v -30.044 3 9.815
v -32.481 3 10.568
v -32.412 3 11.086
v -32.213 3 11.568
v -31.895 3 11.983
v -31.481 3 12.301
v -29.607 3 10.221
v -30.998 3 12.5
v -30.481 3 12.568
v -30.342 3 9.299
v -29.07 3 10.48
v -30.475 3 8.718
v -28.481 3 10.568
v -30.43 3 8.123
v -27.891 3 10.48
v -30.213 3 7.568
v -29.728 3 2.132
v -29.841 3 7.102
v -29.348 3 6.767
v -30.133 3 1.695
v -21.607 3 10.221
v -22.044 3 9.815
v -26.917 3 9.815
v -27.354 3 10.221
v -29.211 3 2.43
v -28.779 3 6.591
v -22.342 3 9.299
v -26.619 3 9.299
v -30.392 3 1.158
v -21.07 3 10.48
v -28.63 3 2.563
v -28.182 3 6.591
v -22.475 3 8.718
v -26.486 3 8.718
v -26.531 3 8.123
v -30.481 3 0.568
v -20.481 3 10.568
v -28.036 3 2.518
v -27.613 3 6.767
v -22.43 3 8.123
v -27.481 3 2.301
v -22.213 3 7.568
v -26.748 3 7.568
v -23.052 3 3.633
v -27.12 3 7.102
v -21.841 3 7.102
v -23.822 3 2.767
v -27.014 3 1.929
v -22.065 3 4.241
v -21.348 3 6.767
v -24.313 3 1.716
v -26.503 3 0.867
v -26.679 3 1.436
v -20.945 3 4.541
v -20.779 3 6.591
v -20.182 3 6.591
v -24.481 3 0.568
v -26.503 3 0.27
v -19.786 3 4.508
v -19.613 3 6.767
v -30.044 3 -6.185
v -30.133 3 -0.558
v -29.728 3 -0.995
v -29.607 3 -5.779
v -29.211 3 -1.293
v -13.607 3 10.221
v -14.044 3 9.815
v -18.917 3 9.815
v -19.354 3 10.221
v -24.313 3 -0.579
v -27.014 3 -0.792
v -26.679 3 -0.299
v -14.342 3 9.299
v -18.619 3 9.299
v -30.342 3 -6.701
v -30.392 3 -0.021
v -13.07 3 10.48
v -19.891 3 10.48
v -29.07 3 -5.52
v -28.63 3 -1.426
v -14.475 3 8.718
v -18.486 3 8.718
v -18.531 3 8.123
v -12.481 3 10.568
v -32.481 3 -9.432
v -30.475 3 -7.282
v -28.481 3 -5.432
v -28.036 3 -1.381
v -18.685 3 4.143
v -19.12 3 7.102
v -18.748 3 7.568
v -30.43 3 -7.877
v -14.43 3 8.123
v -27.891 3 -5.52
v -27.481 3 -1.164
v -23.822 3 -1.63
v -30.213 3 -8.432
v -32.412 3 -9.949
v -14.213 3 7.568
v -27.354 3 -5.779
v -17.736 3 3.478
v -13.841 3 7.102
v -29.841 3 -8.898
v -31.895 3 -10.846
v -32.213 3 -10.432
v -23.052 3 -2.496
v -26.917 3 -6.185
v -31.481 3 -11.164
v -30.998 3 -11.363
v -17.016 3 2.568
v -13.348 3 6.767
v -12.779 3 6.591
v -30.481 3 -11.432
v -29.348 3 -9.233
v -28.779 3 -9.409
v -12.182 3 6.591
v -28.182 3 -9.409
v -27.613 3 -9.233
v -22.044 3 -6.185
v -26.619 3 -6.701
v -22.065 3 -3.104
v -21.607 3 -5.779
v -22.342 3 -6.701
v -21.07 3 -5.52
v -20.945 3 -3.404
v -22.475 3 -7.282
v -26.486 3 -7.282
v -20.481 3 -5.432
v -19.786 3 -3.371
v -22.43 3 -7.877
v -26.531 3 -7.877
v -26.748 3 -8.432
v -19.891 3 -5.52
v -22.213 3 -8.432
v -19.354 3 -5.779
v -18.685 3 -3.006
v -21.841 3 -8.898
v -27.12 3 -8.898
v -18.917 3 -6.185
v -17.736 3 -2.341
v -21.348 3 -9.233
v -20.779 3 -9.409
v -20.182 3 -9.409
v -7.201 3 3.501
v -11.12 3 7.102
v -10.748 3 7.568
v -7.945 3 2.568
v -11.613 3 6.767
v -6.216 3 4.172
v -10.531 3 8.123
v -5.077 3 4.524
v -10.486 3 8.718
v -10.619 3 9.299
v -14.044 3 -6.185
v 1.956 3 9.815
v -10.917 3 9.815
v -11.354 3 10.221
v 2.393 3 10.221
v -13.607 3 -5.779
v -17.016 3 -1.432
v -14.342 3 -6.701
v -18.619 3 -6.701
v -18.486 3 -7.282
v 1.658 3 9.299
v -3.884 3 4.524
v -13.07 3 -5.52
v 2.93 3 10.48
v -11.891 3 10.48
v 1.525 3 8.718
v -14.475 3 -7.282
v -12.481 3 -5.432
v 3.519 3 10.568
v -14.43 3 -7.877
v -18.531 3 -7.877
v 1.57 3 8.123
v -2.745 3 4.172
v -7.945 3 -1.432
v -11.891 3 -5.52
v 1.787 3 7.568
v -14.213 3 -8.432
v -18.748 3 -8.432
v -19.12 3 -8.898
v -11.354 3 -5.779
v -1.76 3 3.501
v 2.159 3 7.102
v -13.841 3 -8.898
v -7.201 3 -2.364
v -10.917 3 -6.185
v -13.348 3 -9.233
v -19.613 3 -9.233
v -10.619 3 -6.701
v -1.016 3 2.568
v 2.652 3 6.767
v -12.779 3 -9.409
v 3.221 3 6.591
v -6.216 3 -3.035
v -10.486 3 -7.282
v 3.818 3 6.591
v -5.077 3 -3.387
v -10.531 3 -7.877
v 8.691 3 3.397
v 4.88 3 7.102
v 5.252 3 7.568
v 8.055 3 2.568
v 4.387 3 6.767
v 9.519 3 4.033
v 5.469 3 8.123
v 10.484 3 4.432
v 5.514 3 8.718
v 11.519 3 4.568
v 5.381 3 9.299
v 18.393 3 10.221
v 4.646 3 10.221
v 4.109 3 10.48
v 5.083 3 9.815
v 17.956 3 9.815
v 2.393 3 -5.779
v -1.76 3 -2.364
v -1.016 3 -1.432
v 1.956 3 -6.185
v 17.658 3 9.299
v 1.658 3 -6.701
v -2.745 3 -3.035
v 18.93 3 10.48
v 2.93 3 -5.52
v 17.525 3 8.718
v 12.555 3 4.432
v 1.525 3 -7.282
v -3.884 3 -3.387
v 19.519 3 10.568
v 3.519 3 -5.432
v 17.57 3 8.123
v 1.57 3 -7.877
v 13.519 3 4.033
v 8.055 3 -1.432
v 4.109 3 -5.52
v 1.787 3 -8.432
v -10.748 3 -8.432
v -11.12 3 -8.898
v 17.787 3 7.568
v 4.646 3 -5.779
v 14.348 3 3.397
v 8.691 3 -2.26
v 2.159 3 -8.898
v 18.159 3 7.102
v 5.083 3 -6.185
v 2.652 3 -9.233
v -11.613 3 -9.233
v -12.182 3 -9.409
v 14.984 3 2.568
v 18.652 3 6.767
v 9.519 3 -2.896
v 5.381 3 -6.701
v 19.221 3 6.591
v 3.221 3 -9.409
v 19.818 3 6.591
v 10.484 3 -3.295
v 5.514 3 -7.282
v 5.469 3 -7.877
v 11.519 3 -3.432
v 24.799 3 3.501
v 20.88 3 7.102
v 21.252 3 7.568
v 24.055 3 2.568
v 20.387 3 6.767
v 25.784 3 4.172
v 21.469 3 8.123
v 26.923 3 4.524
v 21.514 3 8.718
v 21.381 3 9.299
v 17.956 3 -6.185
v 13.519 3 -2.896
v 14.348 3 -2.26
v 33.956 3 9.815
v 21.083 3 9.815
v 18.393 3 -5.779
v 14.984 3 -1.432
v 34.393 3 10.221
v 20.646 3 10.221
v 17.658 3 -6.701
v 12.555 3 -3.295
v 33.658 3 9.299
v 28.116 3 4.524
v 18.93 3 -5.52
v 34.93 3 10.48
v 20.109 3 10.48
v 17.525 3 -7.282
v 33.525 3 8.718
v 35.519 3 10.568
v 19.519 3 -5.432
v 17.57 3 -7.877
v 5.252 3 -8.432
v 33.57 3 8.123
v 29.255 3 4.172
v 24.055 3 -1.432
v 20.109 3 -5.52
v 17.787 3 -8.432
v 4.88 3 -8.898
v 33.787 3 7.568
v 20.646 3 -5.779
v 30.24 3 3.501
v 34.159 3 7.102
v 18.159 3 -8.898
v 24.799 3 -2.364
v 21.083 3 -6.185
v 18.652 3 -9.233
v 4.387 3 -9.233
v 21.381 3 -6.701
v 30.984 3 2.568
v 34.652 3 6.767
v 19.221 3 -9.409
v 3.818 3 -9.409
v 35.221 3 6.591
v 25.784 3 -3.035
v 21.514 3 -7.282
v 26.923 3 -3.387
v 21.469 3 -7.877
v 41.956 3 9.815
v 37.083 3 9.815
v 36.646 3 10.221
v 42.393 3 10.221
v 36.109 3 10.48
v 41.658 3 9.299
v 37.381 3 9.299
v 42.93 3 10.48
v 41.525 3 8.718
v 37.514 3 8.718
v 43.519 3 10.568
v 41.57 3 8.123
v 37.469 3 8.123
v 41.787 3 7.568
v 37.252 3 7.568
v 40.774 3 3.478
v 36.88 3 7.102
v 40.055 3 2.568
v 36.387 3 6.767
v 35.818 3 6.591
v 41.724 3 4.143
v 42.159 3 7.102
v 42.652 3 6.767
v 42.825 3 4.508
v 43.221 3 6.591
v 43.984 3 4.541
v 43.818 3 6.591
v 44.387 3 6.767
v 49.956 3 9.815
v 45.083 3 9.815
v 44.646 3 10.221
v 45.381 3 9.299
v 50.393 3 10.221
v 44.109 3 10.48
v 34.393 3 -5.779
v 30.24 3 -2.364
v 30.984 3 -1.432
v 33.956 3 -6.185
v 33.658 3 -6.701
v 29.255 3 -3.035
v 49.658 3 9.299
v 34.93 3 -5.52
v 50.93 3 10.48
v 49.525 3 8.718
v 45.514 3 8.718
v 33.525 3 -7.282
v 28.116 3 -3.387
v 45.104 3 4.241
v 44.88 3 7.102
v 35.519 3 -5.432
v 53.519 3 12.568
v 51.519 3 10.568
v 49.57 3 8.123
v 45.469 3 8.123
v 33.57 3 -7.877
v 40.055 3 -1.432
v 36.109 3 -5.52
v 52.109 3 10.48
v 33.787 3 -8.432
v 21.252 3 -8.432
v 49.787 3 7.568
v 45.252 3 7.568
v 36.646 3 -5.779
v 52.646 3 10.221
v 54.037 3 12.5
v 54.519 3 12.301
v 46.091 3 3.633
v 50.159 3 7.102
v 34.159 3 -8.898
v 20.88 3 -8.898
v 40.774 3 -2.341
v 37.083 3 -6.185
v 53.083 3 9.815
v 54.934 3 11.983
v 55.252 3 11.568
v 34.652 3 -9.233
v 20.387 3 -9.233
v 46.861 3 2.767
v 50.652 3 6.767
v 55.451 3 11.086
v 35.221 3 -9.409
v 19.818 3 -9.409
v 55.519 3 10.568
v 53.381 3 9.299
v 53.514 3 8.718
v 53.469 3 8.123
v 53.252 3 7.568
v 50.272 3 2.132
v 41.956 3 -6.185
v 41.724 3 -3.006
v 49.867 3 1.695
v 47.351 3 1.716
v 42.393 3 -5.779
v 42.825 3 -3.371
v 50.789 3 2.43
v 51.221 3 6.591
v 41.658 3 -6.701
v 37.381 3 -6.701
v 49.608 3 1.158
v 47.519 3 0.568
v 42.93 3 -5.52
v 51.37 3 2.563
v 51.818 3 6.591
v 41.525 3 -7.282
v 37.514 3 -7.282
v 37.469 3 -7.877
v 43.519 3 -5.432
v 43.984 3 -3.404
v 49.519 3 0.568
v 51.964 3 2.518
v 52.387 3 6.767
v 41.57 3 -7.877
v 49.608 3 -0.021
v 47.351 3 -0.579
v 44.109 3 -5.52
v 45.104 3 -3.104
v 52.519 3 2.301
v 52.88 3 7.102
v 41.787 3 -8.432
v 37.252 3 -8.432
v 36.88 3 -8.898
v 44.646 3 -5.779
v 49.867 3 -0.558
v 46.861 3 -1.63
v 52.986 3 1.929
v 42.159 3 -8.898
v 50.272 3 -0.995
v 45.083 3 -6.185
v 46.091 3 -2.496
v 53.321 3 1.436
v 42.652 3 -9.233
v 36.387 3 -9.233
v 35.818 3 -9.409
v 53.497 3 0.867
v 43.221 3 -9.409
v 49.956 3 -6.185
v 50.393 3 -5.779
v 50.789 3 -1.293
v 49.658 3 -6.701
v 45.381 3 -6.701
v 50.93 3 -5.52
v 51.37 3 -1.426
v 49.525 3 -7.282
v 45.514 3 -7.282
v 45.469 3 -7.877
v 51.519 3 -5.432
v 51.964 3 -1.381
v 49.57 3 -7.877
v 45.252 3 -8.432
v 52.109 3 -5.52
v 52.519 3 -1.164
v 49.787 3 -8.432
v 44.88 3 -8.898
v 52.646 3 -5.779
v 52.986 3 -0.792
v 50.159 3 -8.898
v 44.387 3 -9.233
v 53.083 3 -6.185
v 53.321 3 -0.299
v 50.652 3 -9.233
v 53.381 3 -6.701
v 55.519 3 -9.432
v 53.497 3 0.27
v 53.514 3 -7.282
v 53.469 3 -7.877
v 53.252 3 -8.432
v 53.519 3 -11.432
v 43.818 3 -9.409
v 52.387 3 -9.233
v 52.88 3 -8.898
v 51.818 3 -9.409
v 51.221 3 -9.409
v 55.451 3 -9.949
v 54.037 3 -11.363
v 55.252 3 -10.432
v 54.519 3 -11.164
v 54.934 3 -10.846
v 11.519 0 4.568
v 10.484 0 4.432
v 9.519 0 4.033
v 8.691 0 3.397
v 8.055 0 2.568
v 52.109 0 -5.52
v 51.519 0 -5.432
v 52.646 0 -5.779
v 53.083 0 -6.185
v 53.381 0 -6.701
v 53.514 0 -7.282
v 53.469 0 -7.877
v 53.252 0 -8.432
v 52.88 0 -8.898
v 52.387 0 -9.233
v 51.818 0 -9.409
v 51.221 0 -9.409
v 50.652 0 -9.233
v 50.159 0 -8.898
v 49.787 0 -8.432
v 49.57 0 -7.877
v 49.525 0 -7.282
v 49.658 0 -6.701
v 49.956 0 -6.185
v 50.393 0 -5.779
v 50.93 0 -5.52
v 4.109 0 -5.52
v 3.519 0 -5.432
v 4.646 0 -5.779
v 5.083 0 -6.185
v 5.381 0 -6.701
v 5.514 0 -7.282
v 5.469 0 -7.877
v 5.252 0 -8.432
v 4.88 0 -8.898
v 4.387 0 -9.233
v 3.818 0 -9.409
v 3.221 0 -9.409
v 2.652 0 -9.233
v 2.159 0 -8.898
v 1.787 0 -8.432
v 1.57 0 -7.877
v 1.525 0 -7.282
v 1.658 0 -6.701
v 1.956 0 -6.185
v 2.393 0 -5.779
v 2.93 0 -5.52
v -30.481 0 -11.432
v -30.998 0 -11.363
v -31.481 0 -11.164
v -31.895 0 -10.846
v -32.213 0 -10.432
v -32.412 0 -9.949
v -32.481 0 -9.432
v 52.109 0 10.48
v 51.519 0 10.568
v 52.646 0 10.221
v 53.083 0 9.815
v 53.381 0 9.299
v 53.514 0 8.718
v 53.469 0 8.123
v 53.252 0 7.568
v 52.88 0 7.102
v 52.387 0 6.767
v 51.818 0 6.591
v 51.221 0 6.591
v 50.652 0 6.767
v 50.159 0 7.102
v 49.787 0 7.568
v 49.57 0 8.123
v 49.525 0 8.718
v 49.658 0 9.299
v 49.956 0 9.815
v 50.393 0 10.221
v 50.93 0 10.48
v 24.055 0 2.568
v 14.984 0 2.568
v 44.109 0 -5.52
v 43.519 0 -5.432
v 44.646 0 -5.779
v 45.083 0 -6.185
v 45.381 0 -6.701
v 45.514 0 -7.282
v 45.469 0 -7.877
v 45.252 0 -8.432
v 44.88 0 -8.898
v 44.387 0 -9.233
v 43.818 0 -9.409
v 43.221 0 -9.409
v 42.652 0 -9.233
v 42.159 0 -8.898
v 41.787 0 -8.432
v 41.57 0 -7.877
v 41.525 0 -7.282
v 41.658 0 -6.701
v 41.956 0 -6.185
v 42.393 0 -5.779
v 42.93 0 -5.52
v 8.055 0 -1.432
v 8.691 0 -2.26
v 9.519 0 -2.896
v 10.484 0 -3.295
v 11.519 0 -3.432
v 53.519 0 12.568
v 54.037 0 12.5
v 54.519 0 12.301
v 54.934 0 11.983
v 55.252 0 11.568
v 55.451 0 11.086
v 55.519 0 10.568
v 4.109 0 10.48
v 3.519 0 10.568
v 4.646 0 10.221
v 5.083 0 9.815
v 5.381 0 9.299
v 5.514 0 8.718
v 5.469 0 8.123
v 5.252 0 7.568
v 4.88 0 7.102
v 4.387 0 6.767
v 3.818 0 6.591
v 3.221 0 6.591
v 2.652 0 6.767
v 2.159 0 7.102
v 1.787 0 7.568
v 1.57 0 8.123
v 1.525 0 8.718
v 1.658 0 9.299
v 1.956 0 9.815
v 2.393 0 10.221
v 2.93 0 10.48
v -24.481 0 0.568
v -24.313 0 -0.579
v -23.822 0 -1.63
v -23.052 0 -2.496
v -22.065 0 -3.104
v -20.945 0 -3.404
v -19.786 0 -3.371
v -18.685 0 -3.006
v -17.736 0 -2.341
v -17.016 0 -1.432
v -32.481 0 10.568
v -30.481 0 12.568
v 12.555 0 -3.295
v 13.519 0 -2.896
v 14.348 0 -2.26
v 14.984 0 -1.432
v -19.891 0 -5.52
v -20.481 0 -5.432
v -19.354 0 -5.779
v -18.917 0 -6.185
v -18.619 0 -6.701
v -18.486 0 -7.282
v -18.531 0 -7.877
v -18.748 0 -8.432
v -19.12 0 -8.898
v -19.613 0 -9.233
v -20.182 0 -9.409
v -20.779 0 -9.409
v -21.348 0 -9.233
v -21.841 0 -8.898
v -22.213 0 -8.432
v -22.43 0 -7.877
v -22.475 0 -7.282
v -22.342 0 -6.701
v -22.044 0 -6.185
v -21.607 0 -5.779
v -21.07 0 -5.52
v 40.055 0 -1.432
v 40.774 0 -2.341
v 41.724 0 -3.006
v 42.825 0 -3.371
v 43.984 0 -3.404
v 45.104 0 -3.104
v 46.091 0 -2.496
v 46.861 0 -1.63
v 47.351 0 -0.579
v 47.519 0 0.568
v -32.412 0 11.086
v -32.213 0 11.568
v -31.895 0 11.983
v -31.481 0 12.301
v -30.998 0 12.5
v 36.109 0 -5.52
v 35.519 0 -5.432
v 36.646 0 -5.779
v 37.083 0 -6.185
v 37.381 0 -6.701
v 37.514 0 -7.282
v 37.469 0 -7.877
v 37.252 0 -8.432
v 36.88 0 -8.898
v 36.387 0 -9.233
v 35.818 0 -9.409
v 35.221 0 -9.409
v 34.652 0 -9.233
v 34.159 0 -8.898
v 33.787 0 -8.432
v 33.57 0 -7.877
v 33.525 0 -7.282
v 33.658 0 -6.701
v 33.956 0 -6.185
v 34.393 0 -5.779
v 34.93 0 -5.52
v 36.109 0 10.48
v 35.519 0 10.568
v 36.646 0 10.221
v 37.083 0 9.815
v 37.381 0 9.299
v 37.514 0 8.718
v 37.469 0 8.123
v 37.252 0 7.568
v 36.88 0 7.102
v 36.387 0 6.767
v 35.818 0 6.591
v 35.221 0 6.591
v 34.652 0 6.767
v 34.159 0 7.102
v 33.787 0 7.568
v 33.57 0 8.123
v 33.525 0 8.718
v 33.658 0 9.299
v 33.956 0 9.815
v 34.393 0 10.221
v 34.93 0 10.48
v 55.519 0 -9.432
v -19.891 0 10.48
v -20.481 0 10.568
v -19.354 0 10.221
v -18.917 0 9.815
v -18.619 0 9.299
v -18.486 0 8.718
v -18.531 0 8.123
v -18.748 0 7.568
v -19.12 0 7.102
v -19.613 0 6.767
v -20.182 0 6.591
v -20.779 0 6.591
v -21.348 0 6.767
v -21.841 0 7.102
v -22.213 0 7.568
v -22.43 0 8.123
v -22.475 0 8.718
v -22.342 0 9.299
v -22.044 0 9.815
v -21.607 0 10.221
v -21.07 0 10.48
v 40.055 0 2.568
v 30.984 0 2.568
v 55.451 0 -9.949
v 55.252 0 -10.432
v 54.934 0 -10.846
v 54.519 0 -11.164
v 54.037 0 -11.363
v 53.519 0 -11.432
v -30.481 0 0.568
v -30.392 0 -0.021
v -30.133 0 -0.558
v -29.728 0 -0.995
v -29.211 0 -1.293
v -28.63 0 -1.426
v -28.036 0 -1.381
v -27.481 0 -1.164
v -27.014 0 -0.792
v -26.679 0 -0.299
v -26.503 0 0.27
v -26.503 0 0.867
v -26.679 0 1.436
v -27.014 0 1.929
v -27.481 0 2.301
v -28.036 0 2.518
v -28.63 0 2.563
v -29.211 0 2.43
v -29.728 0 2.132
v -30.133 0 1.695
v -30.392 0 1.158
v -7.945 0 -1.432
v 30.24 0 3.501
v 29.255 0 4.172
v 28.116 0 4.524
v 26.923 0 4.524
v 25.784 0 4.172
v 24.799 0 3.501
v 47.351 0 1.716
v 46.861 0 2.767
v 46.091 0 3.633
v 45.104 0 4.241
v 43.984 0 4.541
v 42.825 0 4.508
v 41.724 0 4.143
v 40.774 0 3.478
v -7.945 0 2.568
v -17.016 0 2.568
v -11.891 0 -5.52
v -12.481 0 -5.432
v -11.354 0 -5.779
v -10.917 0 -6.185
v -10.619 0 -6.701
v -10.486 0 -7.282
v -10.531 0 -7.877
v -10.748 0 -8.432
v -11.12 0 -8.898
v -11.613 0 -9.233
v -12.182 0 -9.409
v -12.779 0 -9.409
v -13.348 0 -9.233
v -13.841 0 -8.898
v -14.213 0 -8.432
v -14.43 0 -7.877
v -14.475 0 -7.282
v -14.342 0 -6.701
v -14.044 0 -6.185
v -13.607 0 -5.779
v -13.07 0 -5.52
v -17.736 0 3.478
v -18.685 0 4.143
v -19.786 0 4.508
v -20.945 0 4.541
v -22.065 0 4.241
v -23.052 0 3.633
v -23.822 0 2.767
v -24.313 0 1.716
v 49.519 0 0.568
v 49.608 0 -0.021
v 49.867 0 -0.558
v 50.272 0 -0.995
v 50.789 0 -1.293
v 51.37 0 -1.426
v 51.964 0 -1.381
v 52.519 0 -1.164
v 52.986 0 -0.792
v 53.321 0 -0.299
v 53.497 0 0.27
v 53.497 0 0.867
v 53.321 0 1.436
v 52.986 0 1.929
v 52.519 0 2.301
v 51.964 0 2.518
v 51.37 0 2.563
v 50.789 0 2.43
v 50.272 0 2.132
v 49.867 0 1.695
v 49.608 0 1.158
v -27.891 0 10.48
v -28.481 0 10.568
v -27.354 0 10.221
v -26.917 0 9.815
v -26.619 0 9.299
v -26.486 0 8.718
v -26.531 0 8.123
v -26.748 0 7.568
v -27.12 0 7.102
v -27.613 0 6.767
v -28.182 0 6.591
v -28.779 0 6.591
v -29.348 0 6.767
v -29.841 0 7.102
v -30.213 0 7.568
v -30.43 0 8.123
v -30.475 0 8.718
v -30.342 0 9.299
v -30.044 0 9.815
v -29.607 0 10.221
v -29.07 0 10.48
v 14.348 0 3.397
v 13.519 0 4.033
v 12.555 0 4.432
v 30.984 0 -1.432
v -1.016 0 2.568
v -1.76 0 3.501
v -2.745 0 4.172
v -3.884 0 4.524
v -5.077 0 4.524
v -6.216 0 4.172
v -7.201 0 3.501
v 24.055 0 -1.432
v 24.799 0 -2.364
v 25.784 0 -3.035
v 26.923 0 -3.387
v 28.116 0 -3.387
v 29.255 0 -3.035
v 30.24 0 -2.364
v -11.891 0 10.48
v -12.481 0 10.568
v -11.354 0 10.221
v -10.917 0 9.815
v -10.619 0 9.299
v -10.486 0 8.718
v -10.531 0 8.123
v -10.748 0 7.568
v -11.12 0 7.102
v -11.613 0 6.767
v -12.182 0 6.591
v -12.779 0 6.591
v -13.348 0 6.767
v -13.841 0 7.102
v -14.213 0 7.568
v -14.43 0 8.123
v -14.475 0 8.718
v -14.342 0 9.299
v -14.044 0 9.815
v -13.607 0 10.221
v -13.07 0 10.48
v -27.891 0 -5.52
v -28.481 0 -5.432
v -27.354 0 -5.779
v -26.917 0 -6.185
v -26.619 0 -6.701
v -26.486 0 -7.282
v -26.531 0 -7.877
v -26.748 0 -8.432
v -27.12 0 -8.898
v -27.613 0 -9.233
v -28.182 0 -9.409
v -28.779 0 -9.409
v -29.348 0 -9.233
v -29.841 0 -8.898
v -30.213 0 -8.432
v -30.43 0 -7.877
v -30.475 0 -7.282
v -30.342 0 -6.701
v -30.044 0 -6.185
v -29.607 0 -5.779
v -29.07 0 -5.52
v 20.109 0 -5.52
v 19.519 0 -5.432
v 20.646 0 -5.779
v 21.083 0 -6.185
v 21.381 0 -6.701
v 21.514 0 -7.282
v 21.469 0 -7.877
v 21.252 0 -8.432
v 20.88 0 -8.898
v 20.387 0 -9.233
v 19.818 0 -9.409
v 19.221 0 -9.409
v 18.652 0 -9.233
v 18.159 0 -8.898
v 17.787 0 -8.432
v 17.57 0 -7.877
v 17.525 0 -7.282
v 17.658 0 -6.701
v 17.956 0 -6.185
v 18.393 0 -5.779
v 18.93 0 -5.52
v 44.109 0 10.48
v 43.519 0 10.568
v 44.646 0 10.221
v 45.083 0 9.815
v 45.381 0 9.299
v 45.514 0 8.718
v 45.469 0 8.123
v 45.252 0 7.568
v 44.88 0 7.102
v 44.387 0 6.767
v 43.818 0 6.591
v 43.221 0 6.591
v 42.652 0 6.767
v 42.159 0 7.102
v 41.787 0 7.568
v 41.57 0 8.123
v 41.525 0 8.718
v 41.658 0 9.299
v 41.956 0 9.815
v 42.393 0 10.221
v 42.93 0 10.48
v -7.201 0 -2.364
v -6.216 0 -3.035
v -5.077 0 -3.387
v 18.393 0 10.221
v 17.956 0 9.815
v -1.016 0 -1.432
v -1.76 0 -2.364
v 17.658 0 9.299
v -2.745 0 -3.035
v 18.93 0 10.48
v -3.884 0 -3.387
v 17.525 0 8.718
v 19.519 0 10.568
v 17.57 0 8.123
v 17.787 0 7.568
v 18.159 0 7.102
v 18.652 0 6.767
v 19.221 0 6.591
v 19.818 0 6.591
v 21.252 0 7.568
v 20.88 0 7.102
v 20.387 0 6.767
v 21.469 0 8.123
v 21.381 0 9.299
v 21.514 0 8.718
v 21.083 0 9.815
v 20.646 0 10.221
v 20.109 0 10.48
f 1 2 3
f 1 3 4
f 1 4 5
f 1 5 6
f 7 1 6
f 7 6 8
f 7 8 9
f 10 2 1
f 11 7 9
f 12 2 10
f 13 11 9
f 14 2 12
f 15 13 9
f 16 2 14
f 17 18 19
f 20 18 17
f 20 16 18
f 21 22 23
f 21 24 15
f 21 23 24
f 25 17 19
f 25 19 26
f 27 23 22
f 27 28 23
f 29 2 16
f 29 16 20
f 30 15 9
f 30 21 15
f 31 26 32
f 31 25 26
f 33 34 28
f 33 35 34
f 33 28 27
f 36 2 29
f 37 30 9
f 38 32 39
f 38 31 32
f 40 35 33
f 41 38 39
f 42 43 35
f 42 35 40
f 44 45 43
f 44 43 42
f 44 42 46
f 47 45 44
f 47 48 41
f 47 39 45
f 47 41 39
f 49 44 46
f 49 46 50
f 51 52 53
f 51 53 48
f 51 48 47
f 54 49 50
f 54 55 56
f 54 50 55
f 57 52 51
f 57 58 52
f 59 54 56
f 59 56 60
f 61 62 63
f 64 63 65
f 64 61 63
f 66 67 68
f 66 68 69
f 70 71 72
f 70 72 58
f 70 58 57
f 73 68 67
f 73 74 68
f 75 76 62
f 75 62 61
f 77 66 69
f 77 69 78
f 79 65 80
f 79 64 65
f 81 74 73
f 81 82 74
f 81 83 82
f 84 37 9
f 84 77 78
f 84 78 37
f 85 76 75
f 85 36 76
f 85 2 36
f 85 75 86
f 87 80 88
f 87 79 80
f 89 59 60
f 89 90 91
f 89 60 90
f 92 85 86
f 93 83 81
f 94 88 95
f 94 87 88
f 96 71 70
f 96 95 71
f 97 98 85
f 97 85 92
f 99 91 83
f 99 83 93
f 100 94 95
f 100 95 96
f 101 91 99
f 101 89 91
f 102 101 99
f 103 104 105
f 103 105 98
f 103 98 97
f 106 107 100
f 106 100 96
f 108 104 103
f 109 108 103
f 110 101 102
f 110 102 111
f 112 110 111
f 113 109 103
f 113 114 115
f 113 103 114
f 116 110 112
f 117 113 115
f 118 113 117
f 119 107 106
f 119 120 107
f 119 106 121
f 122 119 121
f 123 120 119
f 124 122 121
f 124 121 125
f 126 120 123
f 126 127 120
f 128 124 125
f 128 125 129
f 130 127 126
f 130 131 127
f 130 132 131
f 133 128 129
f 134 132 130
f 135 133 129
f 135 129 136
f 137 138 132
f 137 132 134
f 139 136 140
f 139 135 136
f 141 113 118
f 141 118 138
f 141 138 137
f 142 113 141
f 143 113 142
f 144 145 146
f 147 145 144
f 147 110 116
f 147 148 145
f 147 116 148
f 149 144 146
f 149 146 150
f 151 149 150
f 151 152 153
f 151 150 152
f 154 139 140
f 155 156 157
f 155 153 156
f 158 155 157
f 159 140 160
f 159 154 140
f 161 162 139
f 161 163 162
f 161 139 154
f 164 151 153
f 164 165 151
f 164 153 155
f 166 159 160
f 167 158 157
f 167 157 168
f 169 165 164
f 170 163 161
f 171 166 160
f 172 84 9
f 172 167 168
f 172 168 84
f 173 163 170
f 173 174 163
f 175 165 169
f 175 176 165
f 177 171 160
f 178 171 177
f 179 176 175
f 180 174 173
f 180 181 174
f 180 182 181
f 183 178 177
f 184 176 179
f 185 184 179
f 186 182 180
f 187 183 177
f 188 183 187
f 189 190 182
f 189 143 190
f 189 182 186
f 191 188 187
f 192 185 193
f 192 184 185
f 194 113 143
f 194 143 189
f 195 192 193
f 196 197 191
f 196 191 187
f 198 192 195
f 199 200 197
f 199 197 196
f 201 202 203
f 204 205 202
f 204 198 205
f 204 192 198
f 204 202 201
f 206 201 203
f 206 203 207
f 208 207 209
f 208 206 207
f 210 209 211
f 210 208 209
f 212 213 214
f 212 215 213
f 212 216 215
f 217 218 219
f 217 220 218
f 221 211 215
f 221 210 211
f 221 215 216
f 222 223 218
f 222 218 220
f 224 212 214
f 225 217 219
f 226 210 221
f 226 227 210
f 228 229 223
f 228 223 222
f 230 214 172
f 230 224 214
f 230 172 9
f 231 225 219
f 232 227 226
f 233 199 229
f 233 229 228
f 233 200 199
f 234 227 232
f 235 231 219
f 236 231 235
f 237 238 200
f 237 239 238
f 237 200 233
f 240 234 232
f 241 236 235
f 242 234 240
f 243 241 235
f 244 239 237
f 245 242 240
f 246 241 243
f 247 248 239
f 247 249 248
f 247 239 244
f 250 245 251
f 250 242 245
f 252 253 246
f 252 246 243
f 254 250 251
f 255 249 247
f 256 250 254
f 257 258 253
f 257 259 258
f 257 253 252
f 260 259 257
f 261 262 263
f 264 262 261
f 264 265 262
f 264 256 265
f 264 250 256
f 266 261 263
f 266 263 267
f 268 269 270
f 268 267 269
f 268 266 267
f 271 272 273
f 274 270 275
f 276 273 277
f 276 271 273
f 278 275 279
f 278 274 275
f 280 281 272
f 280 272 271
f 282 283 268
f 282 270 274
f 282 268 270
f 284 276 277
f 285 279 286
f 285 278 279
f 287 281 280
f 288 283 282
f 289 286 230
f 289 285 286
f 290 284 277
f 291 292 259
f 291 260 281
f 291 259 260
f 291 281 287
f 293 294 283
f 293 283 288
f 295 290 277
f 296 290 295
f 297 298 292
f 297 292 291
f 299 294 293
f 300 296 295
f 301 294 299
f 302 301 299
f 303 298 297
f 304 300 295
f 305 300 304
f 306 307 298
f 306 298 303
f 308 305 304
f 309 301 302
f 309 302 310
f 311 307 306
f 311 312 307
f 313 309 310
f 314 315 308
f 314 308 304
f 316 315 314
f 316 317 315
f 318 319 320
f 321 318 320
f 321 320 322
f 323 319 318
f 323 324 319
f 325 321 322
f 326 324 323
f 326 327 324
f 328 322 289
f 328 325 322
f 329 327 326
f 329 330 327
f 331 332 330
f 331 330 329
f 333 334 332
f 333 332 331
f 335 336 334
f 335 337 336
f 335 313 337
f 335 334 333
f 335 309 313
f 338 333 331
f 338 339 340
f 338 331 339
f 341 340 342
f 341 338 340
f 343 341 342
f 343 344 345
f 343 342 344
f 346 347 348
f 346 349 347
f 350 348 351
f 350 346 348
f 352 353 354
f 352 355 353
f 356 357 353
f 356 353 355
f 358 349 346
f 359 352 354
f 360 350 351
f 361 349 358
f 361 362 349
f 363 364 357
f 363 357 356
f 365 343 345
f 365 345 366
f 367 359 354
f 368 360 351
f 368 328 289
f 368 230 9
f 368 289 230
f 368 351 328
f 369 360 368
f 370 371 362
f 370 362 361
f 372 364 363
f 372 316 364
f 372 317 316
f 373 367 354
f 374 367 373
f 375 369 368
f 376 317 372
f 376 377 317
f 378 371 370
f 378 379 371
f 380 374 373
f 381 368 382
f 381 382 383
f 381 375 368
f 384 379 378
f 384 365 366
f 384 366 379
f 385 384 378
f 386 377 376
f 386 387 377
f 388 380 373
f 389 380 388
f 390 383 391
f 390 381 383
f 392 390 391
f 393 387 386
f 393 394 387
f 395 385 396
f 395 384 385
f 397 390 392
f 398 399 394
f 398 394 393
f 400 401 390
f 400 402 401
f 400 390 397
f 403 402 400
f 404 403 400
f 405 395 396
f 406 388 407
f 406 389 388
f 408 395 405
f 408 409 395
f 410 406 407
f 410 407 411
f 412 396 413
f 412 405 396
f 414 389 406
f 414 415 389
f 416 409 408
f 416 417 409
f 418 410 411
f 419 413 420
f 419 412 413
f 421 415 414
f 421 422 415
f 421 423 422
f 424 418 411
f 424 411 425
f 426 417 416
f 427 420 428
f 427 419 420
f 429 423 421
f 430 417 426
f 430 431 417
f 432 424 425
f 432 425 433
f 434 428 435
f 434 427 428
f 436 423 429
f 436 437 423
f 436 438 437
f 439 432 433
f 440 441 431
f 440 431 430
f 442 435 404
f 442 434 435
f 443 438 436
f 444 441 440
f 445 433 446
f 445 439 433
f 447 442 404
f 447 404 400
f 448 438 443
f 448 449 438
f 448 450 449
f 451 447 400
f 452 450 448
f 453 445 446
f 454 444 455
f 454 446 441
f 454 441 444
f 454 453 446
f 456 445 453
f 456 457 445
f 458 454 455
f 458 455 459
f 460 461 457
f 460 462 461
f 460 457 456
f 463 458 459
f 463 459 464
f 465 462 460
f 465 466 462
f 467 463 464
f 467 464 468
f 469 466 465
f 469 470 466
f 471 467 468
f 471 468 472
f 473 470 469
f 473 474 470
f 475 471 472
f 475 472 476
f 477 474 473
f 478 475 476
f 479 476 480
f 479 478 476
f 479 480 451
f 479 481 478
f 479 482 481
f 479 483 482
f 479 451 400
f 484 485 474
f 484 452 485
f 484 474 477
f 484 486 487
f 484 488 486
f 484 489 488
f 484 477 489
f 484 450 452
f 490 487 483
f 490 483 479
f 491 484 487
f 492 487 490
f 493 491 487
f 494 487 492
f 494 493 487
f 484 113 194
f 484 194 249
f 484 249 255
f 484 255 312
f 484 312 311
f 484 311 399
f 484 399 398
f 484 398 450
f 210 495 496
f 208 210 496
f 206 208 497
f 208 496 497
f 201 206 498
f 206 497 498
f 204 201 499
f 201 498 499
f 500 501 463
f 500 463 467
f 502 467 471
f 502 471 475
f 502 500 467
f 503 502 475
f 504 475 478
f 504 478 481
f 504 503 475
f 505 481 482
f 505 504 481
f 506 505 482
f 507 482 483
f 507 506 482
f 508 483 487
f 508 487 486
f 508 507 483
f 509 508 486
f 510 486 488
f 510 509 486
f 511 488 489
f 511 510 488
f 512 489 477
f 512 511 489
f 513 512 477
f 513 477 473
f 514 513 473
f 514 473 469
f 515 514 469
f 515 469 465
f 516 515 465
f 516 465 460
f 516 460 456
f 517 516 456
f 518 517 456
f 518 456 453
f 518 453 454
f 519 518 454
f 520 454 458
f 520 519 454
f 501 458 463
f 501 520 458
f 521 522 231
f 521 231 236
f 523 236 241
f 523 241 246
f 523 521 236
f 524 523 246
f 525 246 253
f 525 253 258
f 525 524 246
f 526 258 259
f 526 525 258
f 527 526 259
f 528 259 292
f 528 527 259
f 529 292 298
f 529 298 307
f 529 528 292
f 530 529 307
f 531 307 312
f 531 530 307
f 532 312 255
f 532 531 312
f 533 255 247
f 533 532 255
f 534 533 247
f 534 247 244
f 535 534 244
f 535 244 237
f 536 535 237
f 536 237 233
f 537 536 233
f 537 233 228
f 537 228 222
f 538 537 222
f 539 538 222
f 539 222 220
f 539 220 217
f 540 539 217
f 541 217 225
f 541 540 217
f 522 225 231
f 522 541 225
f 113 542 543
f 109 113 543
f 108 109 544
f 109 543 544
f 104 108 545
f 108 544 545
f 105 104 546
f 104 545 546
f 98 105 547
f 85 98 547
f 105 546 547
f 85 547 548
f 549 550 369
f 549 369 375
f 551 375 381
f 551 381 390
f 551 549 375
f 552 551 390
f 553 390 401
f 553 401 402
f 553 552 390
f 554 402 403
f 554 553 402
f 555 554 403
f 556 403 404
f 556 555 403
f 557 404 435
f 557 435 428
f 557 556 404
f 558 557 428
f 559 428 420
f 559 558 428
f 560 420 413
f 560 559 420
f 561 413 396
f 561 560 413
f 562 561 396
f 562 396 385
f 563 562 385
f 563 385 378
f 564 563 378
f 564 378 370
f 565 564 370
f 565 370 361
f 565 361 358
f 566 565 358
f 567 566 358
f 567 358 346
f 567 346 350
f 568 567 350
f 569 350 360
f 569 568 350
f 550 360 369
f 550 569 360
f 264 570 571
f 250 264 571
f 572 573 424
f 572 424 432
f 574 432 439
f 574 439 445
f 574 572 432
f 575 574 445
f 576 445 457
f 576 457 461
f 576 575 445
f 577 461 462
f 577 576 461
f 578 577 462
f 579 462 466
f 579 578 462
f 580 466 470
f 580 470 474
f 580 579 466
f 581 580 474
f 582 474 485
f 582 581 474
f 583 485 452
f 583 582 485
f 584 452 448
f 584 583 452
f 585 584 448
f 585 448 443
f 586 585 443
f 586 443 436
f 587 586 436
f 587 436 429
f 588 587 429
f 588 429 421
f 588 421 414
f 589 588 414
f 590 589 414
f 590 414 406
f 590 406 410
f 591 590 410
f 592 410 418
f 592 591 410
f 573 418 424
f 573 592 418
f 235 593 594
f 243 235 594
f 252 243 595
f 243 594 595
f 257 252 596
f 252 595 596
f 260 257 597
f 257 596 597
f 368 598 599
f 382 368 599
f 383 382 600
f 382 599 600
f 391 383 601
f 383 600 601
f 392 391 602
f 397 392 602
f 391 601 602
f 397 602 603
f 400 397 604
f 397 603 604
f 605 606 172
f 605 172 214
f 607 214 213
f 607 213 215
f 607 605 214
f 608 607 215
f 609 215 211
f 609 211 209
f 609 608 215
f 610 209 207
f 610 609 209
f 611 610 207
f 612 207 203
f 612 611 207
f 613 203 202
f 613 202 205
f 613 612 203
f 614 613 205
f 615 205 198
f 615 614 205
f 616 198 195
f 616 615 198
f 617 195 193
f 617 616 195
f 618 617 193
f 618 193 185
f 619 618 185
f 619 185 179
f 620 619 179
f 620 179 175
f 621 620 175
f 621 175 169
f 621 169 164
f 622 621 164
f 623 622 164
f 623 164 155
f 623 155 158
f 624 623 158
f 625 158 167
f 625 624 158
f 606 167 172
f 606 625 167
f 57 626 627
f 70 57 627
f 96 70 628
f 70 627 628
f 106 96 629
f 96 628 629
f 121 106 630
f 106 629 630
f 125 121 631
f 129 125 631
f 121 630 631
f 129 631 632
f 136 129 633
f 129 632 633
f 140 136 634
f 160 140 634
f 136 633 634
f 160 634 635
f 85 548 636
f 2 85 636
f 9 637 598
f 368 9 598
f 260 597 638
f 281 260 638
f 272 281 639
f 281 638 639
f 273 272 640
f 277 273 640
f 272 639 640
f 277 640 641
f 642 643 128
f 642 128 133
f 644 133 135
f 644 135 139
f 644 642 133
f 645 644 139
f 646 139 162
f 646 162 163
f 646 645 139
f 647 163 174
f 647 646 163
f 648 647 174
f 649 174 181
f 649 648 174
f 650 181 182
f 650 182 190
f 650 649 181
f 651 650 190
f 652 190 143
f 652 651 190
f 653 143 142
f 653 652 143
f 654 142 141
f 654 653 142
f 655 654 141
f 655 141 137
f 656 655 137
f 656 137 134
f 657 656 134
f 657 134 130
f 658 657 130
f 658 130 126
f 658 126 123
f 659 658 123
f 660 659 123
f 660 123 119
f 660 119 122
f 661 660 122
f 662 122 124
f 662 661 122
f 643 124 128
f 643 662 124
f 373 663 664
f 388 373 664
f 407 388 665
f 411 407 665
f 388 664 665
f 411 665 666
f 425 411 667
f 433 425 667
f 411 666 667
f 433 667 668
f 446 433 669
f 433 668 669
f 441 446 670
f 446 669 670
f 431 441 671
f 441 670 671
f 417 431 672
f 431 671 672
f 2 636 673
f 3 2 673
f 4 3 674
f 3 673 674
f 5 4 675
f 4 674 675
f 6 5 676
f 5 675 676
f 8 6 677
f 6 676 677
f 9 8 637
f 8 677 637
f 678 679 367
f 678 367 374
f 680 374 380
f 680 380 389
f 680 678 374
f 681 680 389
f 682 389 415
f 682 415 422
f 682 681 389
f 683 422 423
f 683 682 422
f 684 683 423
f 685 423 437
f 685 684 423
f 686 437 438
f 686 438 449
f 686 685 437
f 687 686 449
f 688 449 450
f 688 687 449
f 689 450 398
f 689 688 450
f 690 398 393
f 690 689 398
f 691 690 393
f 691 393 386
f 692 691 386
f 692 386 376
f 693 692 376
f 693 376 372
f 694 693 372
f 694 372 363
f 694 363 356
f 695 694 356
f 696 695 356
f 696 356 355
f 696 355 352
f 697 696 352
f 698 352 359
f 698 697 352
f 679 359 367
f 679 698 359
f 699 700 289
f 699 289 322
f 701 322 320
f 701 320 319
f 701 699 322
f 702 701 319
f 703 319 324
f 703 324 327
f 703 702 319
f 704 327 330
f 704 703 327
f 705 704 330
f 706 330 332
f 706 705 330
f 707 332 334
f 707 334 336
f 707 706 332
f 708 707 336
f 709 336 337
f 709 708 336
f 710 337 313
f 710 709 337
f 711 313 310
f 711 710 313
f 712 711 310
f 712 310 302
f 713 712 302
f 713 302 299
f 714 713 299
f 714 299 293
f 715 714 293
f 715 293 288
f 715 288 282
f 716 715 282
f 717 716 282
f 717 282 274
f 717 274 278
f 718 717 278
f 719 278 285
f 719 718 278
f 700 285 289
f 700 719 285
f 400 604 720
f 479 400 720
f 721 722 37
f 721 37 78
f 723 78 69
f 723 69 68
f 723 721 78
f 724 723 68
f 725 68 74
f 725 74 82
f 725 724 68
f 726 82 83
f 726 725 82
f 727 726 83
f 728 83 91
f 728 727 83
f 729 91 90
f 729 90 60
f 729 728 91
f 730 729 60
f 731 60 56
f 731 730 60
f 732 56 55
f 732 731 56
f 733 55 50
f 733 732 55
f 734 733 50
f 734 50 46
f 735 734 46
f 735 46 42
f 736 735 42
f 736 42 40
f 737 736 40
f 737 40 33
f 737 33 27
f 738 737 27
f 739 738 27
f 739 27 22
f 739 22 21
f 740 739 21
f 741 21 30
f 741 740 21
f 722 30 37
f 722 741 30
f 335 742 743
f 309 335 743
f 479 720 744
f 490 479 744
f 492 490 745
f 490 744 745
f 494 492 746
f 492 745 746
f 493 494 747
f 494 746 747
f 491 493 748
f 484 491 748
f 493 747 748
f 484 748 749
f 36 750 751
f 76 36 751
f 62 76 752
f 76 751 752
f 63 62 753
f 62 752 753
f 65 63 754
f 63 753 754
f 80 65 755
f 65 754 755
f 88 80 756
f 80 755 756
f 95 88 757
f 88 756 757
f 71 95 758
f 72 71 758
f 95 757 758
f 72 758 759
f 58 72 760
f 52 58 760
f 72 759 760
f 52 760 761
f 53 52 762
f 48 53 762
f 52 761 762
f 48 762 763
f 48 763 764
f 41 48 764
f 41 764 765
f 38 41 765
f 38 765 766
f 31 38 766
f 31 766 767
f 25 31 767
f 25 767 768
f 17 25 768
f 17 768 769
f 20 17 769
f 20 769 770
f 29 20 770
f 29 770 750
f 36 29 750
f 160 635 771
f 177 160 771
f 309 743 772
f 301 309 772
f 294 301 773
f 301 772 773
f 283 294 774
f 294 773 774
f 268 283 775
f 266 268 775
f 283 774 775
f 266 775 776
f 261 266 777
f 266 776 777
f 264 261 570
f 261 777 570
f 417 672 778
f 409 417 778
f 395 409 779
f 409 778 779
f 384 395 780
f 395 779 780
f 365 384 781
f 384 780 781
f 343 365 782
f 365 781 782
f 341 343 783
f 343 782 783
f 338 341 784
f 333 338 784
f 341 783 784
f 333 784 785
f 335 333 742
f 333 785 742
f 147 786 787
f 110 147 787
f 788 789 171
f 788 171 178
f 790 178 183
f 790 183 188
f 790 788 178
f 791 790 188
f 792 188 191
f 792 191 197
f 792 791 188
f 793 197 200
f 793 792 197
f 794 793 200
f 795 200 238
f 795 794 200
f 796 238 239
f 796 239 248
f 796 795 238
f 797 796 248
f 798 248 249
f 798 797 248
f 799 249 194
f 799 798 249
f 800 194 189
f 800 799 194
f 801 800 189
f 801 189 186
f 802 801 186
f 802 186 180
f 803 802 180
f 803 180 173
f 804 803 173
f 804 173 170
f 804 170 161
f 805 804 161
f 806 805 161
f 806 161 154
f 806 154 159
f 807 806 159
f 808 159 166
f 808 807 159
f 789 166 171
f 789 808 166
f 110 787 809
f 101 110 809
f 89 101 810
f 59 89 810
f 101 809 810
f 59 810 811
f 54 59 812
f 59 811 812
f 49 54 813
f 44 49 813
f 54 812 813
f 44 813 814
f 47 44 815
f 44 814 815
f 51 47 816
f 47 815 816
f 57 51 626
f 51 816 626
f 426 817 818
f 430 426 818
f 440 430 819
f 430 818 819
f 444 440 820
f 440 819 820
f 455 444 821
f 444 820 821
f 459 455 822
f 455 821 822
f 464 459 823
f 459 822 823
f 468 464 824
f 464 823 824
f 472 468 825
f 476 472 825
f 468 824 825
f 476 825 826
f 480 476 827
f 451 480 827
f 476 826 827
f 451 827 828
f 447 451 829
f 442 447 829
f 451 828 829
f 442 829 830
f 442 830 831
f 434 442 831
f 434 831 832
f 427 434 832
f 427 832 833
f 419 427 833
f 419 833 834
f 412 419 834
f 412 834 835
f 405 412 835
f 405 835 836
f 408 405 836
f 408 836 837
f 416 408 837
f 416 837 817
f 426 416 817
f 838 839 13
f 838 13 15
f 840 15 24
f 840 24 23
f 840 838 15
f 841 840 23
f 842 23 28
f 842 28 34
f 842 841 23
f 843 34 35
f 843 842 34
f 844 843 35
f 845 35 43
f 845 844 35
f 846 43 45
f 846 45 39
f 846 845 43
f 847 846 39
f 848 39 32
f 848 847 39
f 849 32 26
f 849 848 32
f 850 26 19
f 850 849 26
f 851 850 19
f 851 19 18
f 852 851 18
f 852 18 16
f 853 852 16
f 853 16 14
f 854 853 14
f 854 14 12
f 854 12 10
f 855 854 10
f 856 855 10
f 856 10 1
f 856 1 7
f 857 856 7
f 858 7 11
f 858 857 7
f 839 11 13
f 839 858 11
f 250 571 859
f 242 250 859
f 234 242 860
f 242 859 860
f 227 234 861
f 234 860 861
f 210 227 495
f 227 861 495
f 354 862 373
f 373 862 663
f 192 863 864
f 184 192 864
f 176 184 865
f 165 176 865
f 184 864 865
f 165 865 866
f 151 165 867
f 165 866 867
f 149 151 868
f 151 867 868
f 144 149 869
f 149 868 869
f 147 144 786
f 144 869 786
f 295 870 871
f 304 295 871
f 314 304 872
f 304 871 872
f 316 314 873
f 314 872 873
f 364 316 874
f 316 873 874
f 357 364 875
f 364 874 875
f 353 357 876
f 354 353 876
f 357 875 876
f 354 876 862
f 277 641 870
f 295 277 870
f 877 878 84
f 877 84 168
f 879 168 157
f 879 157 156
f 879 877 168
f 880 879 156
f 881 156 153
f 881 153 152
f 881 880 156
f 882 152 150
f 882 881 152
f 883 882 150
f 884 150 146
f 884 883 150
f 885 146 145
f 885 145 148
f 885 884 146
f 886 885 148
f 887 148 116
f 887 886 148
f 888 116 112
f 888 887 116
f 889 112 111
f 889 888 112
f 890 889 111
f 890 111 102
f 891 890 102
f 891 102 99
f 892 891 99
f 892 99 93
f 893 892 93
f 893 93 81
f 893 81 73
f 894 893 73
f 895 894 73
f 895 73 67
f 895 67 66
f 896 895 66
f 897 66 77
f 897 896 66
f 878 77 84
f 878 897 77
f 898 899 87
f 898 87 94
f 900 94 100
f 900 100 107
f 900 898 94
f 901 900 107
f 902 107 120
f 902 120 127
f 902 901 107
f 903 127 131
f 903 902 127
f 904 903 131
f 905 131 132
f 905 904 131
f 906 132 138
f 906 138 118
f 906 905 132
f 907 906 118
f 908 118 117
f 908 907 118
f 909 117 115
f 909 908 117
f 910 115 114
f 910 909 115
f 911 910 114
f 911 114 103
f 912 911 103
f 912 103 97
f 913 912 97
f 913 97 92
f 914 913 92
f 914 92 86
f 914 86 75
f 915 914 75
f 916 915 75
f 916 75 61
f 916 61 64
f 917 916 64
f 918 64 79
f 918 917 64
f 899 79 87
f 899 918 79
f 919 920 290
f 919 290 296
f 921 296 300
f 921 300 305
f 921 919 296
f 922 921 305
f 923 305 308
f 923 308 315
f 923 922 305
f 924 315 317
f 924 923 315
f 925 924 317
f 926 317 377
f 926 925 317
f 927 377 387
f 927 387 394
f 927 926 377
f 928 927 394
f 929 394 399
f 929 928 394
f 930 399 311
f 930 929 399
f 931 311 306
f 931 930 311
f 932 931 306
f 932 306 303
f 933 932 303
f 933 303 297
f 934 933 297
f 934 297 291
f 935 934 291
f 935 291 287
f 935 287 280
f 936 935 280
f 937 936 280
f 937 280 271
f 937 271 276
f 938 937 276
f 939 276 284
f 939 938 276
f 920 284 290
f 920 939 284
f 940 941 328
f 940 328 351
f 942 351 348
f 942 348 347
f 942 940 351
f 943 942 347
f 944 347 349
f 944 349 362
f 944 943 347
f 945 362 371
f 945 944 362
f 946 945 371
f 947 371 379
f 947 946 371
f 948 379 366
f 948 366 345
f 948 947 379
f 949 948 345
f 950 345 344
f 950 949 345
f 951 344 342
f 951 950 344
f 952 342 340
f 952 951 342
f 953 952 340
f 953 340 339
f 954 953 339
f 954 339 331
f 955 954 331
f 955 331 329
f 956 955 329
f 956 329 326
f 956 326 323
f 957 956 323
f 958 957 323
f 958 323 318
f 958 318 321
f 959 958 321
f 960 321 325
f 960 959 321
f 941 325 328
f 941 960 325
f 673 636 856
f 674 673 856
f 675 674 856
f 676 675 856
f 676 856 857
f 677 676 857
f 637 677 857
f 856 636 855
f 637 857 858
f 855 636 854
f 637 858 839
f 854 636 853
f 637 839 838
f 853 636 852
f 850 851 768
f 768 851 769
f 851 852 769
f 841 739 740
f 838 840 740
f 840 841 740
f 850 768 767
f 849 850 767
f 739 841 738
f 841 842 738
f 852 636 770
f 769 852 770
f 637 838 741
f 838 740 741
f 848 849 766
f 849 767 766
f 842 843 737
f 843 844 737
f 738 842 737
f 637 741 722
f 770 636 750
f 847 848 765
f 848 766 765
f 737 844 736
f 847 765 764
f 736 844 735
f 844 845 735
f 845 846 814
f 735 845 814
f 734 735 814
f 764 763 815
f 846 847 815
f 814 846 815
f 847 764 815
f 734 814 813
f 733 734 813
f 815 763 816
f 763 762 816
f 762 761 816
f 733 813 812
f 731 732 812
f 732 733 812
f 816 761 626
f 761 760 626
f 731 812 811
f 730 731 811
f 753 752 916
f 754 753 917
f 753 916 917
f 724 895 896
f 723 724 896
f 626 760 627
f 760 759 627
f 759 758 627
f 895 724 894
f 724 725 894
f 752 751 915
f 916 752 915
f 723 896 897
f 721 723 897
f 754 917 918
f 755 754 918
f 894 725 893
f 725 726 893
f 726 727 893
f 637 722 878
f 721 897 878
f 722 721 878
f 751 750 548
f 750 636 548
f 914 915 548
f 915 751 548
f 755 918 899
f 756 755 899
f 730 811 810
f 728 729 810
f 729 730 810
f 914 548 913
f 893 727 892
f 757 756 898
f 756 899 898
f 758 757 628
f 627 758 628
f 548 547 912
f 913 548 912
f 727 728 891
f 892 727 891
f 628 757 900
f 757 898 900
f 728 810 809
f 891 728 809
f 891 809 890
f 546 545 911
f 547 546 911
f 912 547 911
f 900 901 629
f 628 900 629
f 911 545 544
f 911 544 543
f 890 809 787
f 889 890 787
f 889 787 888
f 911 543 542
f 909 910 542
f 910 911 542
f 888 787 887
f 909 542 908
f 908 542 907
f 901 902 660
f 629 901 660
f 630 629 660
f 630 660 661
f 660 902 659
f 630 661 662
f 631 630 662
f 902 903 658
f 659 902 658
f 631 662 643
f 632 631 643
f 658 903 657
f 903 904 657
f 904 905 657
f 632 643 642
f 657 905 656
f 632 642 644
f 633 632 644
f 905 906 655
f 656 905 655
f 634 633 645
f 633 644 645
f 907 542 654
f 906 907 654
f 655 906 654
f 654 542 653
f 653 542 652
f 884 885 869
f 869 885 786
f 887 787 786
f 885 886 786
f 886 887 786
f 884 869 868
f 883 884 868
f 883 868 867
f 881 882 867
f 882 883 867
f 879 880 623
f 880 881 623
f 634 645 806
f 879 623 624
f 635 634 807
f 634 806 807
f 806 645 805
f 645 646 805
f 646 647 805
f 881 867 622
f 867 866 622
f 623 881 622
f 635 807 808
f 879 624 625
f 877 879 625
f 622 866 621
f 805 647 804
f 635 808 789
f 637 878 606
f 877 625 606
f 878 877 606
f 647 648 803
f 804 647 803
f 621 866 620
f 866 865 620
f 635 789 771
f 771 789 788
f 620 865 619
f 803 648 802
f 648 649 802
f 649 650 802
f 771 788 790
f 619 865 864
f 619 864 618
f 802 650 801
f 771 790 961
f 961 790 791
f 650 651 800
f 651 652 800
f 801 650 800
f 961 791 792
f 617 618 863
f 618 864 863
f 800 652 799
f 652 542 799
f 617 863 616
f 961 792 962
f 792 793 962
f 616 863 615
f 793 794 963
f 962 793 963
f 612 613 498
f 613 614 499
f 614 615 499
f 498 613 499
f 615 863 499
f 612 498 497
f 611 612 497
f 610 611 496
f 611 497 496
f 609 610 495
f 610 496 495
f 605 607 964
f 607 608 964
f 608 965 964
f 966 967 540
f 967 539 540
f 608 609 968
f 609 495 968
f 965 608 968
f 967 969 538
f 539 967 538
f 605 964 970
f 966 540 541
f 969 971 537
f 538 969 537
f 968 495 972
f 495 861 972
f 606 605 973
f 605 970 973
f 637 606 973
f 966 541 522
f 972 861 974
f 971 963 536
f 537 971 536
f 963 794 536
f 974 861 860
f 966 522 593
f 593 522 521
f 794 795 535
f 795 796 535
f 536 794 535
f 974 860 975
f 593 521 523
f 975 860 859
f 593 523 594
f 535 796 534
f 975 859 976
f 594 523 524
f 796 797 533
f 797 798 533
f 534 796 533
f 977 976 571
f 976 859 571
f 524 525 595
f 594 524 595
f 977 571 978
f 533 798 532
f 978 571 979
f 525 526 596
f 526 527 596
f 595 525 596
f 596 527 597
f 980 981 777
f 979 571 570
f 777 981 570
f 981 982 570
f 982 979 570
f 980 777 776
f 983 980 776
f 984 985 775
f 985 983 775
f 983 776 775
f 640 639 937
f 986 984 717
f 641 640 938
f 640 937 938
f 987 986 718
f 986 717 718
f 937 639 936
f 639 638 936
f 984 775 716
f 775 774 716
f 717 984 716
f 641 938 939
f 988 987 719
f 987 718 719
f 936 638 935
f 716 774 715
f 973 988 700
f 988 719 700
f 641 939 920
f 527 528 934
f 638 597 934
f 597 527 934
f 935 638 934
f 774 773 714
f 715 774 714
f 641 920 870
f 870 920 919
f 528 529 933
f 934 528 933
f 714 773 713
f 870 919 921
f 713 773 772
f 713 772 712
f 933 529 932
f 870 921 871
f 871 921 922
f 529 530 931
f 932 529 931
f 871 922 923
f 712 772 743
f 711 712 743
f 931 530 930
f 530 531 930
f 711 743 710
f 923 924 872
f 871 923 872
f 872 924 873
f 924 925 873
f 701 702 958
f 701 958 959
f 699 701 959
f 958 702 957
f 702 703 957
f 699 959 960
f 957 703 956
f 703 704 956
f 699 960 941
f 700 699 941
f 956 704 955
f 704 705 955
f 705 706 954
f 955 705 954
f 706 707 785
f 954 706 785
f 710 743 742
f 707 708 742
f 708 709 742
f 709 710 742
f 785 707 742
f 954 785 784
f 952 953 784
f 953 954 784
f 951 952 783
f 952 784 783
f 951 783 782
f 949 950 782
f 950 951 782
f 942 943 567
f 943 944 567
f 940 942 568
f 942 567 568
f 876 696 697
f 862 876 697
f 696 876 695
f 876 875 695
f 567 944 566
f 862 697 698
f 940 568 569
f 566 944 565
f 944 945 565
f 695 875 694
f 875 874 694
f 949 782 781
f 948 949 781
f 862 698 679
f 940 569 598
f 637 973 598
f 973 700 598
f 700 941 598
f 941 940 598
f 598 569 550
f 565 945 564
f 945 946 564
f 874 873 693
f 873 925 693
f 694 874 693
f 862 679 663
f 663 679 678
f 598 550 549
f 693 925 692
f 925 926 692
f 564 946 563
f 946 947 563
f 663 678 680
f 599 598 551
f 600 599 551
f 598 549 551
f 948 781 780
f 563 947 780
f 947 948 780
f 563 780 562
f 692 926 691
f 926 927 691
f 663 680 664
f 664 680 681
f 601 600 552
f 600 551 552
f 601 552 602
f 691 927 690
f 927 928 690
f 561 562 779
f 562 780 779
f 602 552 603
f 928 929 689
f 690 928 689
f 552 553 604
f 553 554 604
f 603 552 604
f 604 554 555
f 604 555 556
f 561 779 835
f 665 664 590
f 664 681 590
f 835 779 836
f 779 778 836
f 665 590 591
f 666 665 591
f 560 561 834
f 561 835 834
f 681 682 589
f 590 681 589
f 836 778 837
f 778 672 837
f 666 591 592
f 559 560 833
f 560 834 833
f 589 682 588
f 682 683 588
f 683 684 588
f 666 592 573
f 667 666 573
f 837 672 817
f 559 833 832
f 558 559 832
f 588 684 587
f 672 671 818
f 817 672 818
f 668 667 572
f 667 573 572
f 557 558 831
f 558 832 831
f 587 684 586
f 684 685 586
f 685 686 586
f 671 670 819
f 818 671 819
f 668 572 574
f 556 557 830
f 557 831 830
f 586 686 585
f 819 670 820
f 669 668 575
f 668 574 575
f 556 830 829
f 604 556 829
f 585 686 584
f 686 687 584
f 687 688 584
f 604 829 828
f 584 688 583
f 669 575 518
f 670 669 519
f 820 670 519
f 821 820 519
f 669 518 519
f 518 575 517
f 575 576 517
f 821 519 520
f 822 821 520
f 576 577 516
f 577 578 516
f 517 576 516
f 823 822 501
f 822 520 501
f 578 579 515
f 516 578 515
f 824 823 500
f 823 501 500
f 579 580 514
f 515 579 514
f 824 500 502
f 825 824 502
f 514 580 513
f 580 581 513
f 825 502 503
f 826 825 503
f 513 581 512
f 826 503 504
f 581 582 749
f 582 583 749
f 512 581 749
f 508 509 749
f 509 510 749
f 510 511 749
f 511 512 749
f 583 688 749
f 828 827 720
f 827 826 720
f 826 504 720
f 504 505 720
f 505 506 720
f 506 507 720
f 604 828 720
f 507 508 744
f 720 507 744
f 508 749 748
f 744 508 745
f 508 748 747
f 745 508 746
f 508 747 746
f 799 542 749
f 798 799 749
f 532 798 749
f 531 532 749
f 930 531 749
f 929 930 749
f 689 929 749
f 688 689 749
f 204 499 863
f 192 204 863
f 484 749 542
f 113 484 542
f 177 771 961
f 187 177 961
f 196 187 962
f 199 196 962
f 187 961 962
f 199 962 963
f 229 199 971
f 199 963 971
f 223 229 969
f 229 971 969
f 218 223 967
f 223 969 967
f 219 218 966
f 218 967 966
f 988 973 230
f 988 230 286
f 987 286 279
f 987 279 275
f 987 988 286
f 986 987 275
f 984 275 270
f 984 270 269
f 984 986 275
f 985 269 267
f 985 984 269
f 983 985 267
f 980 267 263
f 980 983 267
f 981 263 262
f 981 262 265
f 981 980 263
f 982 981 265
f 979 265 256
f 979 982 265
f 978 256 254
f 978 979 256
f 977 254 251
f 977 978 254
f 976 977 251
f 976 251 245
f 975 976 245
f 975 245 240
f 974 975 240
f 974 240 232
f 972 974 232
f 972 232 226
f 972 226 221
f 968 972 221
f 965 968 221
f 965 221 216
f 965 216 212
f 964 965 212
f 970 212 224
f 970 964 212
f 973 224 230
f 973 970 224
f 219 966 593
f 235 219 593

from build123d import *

# Parameters (mm, degrees)
SKETCH1_R           = 2
BOSS_EXTRUDE1_DEPTH = 3


with BuildPart() as part:
    # Sketch1 → Boss-Extrude1 (new body)
    # profile 1 of 4: a face of its own
    with BuildSketch(Plane(origin=(0, 0, 0), x_dir=(1, 0, 0), z_dir=(0, 1, 0))):
        with BuildLine():
            Line((-30.480543451, -12.568481461), (11.519456549, -12.568481461))
            Line((11.519456549, -12.568481461), (11.519456549, -4.568481461))
            ThreePointArc((11.519456549, -4.568481461), (9.519456549, -4.032583076), (8.055354934, -2.568481461))
            Line((8.055354934, -2.568481461), (-1.016441836, -2.568481461))
            ThreePointArc((-1.016441836, -2.568481461), (-4.480543451, -4.568481461), (-7.944645066, -2.568481461))
            Line((-7.944645066, -2.568481461), (-17.016441836, -2.568481461))
            ThreePointArc((-17.016441836, -2.568481461), (-21.515819631, -4.432184766), (-24.480543451, -0.568481461))
            Line((-24.480543451, -0.568481461), (-26.480543451, -0.568481461))
            ThreePointArc((-26.480543451, -0.568481461), (-28.480543451, -2.568481461), (-30.480543451, -0.568481461))
            Line((-30.480543451, -0.568481461), (-32.480543451, -0.568481461))
            Line((-32.480543451, -0.568481461), (-32.480543451, -10.568481461))
            ThreePointArc((-32.480543451, -10.568481461), (-31.894757013, -11.982695023), (-30.480543451, -12.568481461))
        make_face()
        with Locations(Location((-28.480543451, -8.568481461, 0), (0, 0, 270))):
            Circle(SKETCH1_R, mode=Mode.SUBTRACT)
        with Locations(Location((-20.480543451, -8.568481461, 0), (0, 0, 270))):
            Circle(SKETCH1_R, mode=Mode.SUBTRACT)
        with Locations(Location((-12.480543451, -8.568481461, 0), (0, 0, 270))):
            Circle(SKETCH1_R, mode=Mode.SUBTRACT)
        with Locations(Location((3.519456549, -8.568481461, 0), (0, 0, 270))):
            Circle(SKETCH1_R, mode=Mode.SUBTRACT)
    # profile 2 of 4: a face of its own
    with BuildSketch(Plane(origin=(0, 0, 0), x_dir=(1, 0, 0), z_dir=(0, 1, 0))):
        with BuildLine():
            Line((11.519456549, 3.431518539), (11.519456549, 11.431518539))
            Line((11.519456549, 11.431518539), (-30.480543451, 11.431518539))
            ThreePointArc((-30.480543451, 11.431518539), (-31.894757013, 10.845732102), (-32.480543451, 9.431518539))
            Line((-32.480543451, 9.431518539), (-32.480543451, -0.568481461))
            Line((-32.480543451, -0.568481461), (-30.480543451, -0.568481461))
            ThreePointArc((-30.480543451, -0.568481461), (-28.480543451, 1.431518539), (-26.480543451, -0.568481461))
            Line((-26.480543451, -0.568481461), (-24.480543451, -0.568481461))
            ThreePointArc((-24.480543451, -0.568481461), (-21.515819631, 3.295221845), (-17.016441836, 1.431518539))
            Line((-17.016441836, 1.431518539), (-7.944645066, 1.431518539))
            ThreePointArc((-7.944645066, 1.431518539), (-4.480543451, 3.431518539), (-1.016441836, 1.431518539))
            Line((-1.016441836, 1.431518539), (8.055354934, 1.431518539))
            ThreePointArc((8.055354934, 1.431518539), (9.519456549, 2.895620155), (11.519456549, 3.431518539))
        make_face()
        with Locations(Location((-28.480543451, 7.431518539, 0), (0, 0, 270))):
            Circle(SKETCH1_R, mode=Mode.SUBTRACT)
        with Locations(Location((-20.480543451, 7.431518539, 0), (0, 0, 270))):
            Circle(SKETCH1_R, mode=Mode.SUBTRACT)
        with Locations(Location((-12.480543451, 7.431518539, 0), (0, 0, 270))):
            Circle(SKETCH1_R, mode=Mode.SUBTRACT)
        with Locations(Location((3.519456549, 7.431518539, 0), (0, 0, 270))):
            Circle(SKETCH1_R, mode=Mode.SUBTRACT)
    # profile 3 of 4: a face of its own
    with BuildSketch(Plane(origin=(0, 0, 0), x_dir=(1, 0, 0), z_dir=(0, 1, 0))):
        with BuildLine():
            ThreePointArc((49.519456549, -0.568481461), (51.519456549, 1.431518539), (53.519456549, -0.568481461))
            Line((53.519456549, -0.568481461), (55.519456549, -0.568481461))
            Line((55.519456549, -0.568481461), (55.519456549, 9.431518539))
            ThreePointArc((55.519456549, 9.431518539), (54.933670112, 10.845732102), (53.519456549, 11.431518539))
            Line((53.519456549, 11.431518539), (11.519456549, 11.431518539))
            Line((11.519456549, 11.431518539), (11.519456549, 3.431518539))
            ThreePointArc((11.519456549, 3.431518539), (13.519456549, 2.895620155), (14.983558164, 1.431518539))
            Line((14.983558164, 1.431518539), (24.055354934, 1.431518539))
            ThreePointArc((24.055354934, 1.431518539), (27.519456549, 3.431518539), (30.983558164, 1.431518539))
            Line((30.983558164, 1.431518539), (40.055354934, 1.431518539))
            ThreePointArc((40.055354934, 1.431518539), (44.55473273, 3.295221845), (47.519456549, -0.568481461))
            Line((47.519456549, -0.568481461), (49.519456549, -0.568481461))
        make_face()
        with Locations(Location((19.519456549, 7.431518539, 0), (0, 0, 270))):
            Circle(SKETCH1_R, mode=Mode.SUBTRACT)
        with Locations(Location((35.519456549, 7.431518539, 0), (0, 0, 270))):
            Circle(SKETCH1_R, mode=Mode.SUBTRACT)
        with Locations(Location((43.519456549, 7.431518539, 0), (0, 0, 270))):
            Circle(SKETCH1_R, mode=Mode.SUBTRACT)
        with Locations(Location((51.519456549, 7.431518539, 0), (0, 0, 270))):
            Circle(SKETCH1_R, mode=Mode.SUBTRACT)
    # profile 4 of 4: a face of its own
    with BuildSketch(Plane(origin=(0, 0, 0), x_dir=(1, 0, 0), z_dir=(0, 1, 0))):
        with BuildLine():
            Line((55.519456549, -0.568481461), (53.519456549, -0.568481461))
            ThreePointArc((53.519456549, -0.568481461), (51.519456549, -2.568481461), (49.519456549, -0.568481461))
            Line((49.519456549, -0.568481461), (47.519456549, -0.568481461))
            ThreePointArc((47.519456549, -0.568481461), (44.55473273, -4.432184766), (40.055354934, -2.568481461))
            Line((40.055354934, -2.568481461), (30.983558164, -2.568481461))
            ThreePointArc((30.983558164, -2.568481461), (27.519456549, -4.568481461), (24.055354934, -2.568481461))
            Line((24.055354934, -2.568481461), (14.983558164, -2.568481461))
            ThreePointArc((14.983558164, -2.568481461), (13.519456549, -4.032583076), (11.519456549, -4.568481461))
            Line((11.519456549, -4.568481461), (11.519456549, -12.568481461))
            Line((11.519456549, -12.568481461), (53.519456549, -12.568481461))
            ThreePointArc((53.519456549, -12.568481461), (54.933670112, -11.982695023), (55.519456549, -10.568481461))
            Line((55.519456549, -10.568481461), (55.519456549, -0.568481461))
        make_face()
        with Locations(Location((19.519456549, -8.568481461, 0), (0, 0, 270))):
            Circle(SKETCH1_R, mode=Mode.SUBTRACT)
        with Locations(Location((35.519456549, -8.568481461, 0), (0, 0, 270))):
            Circle(SKETCH1_R, mode=Mode.SUBTRACT)
        with Locations(Location((43.519456549, -8.568481461, 0), (0, 0, 270))):
            Circle(SKETCH1_R, mode=Mode.SUBTRACT)
        with Locations(Location((51.519456549, -8.568481461, 0), (0, 0, 270))):
            Circle(SKETCH1_R, mode=Mode.SUBTRACT)
    extrude(amount=BOSS_EXTRUDE1_DEPTH)


solid = part.part
